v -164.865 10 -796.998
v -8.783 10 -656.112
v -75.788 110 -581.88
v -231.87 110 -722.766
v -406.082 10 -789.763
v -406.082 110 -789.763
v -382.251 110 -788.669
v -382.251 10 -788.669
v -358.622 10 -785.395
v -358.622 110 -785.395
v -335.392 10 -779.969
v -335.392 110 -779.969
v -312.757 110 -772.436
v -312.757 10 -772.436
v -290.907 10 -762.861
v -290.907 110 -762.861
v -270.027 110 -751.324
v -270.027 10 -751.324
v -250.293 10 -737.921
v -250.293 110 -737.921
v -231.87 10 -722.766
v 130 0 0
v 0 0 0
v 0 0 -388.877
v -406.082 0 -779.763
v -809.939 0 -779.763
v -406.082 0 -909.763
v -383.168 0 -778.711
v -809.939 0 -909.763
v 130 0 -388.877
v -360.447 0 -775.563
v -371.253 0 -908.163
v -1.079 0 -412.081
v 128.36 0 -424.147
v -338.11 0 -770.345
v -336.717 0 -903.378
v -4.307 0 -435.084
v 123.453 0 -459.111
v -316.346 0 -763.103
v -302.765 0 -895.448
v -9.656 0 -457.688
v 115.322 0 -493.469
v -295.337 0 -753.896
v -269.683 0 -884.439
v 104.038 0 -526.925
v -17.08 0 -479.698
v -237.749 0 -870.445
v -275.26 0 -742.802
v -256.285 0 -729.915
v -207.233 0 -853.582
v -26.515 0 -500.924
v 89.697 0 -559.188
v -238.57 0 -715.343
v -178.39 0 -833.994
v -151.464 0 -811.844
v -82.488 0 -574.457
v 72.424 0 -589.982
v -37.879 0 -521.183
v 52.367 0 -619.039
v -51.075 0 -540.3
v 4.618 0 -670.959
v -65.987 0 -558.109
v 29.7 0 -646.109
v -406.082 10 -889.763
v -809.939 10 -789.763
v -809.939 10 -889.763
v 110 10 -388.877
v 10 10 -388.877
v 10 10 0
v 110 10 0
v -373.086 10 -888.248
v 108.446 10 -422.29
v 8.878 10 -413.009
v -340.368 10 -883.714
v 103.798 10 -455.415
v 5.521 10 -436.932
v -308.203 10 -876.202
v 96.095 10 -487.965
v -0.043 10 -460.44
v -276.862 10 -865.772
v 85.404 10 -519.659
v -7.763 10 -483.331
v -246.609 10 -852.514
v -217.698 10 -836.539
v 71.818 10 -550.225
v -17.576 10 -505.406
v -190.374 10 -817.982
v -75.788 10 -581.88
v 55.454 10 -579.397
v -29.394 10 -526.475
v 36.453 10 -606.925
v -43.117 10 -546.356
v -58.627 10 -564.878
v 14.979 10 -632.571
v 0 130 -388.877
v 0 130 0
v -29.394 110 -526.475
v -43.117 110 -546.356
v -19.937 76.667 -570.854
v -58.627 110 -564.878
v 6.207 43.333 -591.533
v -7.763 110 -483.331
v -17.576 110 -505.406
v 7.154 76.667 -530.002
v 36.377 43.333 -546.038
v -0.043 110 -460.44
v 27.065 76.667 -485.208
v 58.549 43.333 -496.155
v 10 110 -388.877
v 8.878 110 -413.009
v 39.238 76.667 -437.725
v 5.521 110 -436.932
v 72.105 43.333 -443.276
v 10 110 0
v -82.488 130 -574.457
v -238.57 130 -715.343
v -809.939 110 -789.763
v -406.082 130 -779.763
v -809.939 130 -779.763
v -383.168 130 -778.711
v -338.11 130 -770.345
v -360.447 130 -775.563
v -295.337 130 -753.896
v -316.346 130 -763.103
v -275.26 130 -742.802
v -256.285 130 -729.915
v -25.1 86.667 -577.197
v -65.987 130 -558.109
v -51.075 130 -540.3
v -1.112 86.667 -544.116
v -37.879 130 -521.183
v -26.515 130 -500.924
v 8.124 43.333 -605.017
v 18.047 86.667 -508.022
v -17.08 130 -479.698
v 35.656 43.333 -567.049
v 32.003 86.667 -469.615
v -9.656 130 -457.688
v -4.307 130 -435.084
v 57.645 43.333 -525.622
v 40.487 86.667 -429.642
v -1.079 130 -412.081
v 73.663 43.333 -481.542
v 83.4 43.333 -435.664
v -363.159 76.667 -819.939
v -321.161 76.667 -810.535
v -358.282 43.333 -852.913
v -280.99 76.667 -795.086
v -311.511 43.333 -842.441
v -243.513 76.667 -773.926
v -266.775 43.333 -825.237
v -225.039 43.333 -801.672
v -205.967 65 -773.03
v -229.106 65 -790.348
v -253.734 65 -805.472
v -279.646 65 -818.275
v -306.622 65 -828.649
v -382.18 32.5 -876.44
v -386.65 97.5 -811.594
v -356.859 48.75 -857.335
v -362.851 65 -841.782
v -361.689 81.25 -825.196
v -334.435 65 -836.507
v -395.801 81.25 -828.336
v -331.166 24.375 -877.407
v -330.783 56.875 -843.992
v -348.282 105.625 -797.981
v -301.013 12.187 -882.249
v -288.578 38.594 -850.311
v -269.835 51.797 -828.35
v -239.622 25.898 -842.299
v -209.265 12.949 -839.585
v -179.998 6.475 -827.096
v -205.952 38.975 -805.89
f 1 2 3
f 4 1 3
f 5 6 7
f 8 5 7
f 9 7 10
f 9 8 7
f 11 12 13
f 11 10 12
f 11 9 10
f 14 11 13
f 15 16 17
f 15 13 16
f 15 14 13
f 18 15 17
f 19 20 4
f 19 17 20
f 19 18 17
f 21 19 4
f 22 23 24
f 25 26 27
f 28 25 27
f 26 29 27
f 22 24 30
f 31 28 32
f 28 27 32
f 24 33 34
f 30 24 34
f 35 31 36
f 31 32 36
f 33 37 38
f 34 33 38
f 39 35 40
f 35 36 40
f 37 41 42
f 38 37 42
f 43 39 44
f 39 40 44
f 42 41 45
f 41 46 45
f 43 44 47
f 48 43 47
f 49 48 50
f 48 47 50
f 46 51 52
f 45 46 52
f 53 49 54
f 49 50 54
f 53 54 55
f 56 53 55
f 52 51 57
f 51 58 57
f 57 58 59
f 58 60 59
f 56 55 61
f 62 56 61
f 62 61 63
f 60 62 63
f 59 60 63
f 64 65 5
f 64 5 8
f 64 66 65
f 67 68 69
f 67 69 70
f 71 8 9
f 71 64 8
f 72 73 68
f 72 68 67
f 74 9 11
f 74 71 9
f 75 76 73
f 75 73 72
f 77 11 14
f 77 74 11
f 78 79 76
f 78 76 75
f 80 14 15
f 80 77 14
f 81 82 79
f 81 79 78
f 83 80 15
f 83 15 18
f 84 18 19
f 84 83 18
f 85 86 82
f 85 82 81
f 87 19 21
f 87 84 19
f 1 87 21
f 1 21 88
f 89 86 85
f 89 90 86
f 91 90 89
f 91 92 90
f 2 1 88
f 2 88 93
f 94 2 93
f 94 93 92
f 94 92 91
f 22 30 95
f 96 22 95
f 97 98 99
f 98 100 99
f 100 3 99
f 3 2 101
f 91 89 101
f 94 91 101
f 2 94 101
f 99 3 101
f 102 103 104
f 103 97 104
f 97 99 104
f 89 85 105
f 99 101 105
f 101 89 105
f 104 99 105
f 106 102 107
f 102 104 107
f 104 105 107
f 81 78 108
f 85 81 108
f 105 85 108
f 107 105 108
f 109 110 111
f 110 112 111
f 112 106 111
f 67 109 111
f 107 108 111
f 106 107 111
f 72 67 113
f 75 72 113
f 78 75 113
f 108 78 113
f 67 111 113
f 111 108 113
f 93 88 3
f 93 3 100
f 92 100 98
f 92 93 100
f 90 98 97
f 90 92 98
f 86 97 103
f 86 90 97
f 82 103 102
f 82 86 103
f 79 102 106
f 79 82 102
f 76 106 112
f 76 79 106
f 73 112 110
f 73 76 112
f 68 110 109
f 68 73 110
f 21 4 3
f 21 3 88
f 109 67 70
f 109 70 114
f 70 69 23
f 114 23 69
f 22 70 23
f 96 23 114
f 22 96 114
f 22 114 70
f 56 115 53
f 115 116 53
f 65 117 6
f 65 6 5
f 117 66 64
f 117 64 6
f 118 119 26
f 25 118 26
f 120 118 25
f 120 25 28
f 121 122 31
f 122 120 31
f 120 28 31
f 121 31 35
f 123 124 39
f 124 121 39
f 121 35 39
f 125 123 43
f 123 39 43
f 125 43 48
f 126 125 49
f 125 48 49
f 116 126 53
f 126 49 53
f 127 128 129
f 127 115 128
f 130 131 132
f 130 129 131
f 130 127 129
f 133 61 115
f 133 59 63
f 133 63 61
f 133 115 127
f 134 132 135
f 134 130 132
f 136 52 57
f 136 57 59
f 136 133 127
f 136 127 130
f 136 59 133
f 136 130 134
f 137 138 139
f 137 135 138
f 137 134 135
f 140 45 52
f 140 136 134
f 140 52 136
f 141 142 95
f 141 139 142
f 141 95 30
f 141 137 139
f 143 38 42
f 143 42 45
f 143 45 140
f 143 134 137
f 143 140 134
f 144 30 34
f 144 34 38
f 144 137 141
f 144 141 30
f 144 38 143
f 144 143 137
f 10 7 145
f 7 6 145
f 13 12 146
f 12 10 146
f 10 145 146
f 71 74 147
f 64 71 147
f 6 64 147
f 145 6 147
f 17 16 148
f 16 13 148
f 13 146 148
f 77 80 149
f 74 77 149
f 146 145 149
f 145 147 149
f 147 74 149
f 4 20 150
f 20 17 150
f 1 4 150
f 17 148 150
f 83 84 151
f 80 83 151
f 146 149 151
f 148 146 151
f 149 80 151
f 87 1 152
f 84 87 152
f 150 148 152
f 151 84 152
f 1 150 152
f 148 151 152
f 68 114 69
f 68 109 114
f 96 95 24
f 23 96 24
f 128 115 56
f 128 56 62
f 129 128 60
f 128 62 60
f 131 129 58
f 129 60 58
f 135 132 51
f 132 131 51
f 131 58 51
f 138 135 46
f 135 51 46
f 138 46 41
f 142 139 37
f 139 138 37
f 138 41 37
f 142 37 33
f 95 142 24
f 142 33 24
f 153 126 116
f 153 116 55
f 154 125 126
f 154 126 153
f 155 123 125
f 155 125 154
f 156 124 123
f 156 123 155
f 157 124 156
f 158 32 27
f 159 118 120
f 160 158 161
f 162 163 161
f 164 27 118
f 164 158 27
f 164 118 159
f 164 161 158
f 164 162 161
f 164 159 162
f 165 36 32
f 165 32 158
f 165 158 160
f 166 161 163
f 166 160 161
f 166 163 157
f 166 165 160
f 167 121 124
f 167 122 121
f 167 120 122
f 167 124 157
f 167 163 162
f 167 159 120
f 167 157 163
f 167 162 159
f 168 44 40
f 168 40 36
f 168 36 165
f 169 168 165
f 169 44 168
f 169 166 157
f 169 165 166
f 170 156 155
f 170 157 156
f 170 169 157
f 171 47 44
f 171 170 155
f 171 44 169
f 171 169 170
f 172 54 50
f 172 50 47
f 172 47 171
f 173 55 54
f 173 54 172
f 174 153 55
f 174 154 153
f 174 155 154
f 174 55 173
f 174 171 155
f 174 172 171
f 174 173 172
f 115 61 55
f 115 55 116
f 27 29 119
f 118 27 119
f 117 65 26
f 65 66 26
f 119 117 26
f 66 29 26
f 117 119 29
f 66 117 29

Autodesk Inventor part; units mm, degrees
ref_plane "YZ Plane" through (0, 0, 0) normal (1, 0, 0) x (0, 1, 0)
ref_plane "XZ Plane" through (0, 0, 0) normal (0, 1, 0) x (-1, 0, 0)
ref_plane "XY Plane" through (0, 0, 0) normal (0, 0, 1) x (1, 0, 0)
sketch "Эскиз1" plane through (0, 0, 0) normal (0, 0, 1) x (1, 0, 0)
  line L0 (0, 0) -> (0, 130)
  line L1 (0, 0) -> (130, 0)
  line L2 (130, 0) -> (0, 130)
  dimension "d0" = 130
  dimension "d1" = 130
sketch "Эскиз2" plane through (0, 0, 0) normal (0, 1, 0) x (-1, 0, 0)
  point P0 (0, 0)
sketch "Эскиз3" plane through (0, 0, 0) normal (0, 1, 0) x (-1, 0, 0)
  point P0 (0, 0)
sketch "Эскиз4" plane through (0, 0, 0) normal (0, 0, 1) x (1, 0, 0)
  line L0 (0, 0) -> (10, 0)
  line L1 (10, 10) -> (10, 110)
  line L2 (10, 10) -> (110, 10)
  line L3 (110, 10) -> (10, 110)
  dimension "d3" = 10
  dimension "d4" = 100
  dimension "d5" = 100
sketch "Эскиз5" plane through (0, 0, 0) normal (0, 1, 0) x (-1, 0, 0)
  line L0 (0, 0) -> (0, -388.8774)
  line L1 (82.4884, -574.4573) -> (238.5702, -715.3428)
  line L2 (406.0818, -779.7629) -> (809.939, -779.7629)
  arc A0 (0, -388.8774) -> (82.4884, -574.4573) centre (250, -388.8774) ccw
  arc A1 (238.5702, -715.3428) -> (406.0818, -779.7629) centre (406.0818, -529.7629) ccw
  point P0 (0, -500)
  point P1 (309.939, -779.7629)
  dimension "d6" = 500
  dimension "d7" = 500
  dimension "d8" = 250
sketch "Эскиз6" plane through (0, 0, 0) normal (0, 1, 0) x (-1, 0, 0)
  point P0 (0, 0)
sketch "Эскиз7" plane through (0, 0, 0) normal (0, 0, 1) x (1, 0, 0)
  point P0 (0, 0)
sweep "Сдвиг1" add profiles "Эскиз1" path "Эскиз5"
sketch3d "3D эскиз1"
  line L0 (0, 0, 0) -> (0, 0, -388.8774)
  arc A0 (0, 0, -388.8774) -> (-82.4884, 0, -574.4573) centre (-250, 0, -388.8774) ccw
  line L1 (-82.4884, 0, -574.4573) -> (-238.5702, 0, -715.3428)
  arc A1 (-238.5702, 0, -715.3428) -> (-406.0818, 0, -779.7629) centre (-406.0818, 0, -529.7629) ccw
  line L2 (-406.0818, 0, -779.7629) -> (-809.939, 0, -779.7629)
sweep "Сдвиг2" cut profiles "Эскиз4" path "3D эскиз1"
properties part number "lab_4_4"
